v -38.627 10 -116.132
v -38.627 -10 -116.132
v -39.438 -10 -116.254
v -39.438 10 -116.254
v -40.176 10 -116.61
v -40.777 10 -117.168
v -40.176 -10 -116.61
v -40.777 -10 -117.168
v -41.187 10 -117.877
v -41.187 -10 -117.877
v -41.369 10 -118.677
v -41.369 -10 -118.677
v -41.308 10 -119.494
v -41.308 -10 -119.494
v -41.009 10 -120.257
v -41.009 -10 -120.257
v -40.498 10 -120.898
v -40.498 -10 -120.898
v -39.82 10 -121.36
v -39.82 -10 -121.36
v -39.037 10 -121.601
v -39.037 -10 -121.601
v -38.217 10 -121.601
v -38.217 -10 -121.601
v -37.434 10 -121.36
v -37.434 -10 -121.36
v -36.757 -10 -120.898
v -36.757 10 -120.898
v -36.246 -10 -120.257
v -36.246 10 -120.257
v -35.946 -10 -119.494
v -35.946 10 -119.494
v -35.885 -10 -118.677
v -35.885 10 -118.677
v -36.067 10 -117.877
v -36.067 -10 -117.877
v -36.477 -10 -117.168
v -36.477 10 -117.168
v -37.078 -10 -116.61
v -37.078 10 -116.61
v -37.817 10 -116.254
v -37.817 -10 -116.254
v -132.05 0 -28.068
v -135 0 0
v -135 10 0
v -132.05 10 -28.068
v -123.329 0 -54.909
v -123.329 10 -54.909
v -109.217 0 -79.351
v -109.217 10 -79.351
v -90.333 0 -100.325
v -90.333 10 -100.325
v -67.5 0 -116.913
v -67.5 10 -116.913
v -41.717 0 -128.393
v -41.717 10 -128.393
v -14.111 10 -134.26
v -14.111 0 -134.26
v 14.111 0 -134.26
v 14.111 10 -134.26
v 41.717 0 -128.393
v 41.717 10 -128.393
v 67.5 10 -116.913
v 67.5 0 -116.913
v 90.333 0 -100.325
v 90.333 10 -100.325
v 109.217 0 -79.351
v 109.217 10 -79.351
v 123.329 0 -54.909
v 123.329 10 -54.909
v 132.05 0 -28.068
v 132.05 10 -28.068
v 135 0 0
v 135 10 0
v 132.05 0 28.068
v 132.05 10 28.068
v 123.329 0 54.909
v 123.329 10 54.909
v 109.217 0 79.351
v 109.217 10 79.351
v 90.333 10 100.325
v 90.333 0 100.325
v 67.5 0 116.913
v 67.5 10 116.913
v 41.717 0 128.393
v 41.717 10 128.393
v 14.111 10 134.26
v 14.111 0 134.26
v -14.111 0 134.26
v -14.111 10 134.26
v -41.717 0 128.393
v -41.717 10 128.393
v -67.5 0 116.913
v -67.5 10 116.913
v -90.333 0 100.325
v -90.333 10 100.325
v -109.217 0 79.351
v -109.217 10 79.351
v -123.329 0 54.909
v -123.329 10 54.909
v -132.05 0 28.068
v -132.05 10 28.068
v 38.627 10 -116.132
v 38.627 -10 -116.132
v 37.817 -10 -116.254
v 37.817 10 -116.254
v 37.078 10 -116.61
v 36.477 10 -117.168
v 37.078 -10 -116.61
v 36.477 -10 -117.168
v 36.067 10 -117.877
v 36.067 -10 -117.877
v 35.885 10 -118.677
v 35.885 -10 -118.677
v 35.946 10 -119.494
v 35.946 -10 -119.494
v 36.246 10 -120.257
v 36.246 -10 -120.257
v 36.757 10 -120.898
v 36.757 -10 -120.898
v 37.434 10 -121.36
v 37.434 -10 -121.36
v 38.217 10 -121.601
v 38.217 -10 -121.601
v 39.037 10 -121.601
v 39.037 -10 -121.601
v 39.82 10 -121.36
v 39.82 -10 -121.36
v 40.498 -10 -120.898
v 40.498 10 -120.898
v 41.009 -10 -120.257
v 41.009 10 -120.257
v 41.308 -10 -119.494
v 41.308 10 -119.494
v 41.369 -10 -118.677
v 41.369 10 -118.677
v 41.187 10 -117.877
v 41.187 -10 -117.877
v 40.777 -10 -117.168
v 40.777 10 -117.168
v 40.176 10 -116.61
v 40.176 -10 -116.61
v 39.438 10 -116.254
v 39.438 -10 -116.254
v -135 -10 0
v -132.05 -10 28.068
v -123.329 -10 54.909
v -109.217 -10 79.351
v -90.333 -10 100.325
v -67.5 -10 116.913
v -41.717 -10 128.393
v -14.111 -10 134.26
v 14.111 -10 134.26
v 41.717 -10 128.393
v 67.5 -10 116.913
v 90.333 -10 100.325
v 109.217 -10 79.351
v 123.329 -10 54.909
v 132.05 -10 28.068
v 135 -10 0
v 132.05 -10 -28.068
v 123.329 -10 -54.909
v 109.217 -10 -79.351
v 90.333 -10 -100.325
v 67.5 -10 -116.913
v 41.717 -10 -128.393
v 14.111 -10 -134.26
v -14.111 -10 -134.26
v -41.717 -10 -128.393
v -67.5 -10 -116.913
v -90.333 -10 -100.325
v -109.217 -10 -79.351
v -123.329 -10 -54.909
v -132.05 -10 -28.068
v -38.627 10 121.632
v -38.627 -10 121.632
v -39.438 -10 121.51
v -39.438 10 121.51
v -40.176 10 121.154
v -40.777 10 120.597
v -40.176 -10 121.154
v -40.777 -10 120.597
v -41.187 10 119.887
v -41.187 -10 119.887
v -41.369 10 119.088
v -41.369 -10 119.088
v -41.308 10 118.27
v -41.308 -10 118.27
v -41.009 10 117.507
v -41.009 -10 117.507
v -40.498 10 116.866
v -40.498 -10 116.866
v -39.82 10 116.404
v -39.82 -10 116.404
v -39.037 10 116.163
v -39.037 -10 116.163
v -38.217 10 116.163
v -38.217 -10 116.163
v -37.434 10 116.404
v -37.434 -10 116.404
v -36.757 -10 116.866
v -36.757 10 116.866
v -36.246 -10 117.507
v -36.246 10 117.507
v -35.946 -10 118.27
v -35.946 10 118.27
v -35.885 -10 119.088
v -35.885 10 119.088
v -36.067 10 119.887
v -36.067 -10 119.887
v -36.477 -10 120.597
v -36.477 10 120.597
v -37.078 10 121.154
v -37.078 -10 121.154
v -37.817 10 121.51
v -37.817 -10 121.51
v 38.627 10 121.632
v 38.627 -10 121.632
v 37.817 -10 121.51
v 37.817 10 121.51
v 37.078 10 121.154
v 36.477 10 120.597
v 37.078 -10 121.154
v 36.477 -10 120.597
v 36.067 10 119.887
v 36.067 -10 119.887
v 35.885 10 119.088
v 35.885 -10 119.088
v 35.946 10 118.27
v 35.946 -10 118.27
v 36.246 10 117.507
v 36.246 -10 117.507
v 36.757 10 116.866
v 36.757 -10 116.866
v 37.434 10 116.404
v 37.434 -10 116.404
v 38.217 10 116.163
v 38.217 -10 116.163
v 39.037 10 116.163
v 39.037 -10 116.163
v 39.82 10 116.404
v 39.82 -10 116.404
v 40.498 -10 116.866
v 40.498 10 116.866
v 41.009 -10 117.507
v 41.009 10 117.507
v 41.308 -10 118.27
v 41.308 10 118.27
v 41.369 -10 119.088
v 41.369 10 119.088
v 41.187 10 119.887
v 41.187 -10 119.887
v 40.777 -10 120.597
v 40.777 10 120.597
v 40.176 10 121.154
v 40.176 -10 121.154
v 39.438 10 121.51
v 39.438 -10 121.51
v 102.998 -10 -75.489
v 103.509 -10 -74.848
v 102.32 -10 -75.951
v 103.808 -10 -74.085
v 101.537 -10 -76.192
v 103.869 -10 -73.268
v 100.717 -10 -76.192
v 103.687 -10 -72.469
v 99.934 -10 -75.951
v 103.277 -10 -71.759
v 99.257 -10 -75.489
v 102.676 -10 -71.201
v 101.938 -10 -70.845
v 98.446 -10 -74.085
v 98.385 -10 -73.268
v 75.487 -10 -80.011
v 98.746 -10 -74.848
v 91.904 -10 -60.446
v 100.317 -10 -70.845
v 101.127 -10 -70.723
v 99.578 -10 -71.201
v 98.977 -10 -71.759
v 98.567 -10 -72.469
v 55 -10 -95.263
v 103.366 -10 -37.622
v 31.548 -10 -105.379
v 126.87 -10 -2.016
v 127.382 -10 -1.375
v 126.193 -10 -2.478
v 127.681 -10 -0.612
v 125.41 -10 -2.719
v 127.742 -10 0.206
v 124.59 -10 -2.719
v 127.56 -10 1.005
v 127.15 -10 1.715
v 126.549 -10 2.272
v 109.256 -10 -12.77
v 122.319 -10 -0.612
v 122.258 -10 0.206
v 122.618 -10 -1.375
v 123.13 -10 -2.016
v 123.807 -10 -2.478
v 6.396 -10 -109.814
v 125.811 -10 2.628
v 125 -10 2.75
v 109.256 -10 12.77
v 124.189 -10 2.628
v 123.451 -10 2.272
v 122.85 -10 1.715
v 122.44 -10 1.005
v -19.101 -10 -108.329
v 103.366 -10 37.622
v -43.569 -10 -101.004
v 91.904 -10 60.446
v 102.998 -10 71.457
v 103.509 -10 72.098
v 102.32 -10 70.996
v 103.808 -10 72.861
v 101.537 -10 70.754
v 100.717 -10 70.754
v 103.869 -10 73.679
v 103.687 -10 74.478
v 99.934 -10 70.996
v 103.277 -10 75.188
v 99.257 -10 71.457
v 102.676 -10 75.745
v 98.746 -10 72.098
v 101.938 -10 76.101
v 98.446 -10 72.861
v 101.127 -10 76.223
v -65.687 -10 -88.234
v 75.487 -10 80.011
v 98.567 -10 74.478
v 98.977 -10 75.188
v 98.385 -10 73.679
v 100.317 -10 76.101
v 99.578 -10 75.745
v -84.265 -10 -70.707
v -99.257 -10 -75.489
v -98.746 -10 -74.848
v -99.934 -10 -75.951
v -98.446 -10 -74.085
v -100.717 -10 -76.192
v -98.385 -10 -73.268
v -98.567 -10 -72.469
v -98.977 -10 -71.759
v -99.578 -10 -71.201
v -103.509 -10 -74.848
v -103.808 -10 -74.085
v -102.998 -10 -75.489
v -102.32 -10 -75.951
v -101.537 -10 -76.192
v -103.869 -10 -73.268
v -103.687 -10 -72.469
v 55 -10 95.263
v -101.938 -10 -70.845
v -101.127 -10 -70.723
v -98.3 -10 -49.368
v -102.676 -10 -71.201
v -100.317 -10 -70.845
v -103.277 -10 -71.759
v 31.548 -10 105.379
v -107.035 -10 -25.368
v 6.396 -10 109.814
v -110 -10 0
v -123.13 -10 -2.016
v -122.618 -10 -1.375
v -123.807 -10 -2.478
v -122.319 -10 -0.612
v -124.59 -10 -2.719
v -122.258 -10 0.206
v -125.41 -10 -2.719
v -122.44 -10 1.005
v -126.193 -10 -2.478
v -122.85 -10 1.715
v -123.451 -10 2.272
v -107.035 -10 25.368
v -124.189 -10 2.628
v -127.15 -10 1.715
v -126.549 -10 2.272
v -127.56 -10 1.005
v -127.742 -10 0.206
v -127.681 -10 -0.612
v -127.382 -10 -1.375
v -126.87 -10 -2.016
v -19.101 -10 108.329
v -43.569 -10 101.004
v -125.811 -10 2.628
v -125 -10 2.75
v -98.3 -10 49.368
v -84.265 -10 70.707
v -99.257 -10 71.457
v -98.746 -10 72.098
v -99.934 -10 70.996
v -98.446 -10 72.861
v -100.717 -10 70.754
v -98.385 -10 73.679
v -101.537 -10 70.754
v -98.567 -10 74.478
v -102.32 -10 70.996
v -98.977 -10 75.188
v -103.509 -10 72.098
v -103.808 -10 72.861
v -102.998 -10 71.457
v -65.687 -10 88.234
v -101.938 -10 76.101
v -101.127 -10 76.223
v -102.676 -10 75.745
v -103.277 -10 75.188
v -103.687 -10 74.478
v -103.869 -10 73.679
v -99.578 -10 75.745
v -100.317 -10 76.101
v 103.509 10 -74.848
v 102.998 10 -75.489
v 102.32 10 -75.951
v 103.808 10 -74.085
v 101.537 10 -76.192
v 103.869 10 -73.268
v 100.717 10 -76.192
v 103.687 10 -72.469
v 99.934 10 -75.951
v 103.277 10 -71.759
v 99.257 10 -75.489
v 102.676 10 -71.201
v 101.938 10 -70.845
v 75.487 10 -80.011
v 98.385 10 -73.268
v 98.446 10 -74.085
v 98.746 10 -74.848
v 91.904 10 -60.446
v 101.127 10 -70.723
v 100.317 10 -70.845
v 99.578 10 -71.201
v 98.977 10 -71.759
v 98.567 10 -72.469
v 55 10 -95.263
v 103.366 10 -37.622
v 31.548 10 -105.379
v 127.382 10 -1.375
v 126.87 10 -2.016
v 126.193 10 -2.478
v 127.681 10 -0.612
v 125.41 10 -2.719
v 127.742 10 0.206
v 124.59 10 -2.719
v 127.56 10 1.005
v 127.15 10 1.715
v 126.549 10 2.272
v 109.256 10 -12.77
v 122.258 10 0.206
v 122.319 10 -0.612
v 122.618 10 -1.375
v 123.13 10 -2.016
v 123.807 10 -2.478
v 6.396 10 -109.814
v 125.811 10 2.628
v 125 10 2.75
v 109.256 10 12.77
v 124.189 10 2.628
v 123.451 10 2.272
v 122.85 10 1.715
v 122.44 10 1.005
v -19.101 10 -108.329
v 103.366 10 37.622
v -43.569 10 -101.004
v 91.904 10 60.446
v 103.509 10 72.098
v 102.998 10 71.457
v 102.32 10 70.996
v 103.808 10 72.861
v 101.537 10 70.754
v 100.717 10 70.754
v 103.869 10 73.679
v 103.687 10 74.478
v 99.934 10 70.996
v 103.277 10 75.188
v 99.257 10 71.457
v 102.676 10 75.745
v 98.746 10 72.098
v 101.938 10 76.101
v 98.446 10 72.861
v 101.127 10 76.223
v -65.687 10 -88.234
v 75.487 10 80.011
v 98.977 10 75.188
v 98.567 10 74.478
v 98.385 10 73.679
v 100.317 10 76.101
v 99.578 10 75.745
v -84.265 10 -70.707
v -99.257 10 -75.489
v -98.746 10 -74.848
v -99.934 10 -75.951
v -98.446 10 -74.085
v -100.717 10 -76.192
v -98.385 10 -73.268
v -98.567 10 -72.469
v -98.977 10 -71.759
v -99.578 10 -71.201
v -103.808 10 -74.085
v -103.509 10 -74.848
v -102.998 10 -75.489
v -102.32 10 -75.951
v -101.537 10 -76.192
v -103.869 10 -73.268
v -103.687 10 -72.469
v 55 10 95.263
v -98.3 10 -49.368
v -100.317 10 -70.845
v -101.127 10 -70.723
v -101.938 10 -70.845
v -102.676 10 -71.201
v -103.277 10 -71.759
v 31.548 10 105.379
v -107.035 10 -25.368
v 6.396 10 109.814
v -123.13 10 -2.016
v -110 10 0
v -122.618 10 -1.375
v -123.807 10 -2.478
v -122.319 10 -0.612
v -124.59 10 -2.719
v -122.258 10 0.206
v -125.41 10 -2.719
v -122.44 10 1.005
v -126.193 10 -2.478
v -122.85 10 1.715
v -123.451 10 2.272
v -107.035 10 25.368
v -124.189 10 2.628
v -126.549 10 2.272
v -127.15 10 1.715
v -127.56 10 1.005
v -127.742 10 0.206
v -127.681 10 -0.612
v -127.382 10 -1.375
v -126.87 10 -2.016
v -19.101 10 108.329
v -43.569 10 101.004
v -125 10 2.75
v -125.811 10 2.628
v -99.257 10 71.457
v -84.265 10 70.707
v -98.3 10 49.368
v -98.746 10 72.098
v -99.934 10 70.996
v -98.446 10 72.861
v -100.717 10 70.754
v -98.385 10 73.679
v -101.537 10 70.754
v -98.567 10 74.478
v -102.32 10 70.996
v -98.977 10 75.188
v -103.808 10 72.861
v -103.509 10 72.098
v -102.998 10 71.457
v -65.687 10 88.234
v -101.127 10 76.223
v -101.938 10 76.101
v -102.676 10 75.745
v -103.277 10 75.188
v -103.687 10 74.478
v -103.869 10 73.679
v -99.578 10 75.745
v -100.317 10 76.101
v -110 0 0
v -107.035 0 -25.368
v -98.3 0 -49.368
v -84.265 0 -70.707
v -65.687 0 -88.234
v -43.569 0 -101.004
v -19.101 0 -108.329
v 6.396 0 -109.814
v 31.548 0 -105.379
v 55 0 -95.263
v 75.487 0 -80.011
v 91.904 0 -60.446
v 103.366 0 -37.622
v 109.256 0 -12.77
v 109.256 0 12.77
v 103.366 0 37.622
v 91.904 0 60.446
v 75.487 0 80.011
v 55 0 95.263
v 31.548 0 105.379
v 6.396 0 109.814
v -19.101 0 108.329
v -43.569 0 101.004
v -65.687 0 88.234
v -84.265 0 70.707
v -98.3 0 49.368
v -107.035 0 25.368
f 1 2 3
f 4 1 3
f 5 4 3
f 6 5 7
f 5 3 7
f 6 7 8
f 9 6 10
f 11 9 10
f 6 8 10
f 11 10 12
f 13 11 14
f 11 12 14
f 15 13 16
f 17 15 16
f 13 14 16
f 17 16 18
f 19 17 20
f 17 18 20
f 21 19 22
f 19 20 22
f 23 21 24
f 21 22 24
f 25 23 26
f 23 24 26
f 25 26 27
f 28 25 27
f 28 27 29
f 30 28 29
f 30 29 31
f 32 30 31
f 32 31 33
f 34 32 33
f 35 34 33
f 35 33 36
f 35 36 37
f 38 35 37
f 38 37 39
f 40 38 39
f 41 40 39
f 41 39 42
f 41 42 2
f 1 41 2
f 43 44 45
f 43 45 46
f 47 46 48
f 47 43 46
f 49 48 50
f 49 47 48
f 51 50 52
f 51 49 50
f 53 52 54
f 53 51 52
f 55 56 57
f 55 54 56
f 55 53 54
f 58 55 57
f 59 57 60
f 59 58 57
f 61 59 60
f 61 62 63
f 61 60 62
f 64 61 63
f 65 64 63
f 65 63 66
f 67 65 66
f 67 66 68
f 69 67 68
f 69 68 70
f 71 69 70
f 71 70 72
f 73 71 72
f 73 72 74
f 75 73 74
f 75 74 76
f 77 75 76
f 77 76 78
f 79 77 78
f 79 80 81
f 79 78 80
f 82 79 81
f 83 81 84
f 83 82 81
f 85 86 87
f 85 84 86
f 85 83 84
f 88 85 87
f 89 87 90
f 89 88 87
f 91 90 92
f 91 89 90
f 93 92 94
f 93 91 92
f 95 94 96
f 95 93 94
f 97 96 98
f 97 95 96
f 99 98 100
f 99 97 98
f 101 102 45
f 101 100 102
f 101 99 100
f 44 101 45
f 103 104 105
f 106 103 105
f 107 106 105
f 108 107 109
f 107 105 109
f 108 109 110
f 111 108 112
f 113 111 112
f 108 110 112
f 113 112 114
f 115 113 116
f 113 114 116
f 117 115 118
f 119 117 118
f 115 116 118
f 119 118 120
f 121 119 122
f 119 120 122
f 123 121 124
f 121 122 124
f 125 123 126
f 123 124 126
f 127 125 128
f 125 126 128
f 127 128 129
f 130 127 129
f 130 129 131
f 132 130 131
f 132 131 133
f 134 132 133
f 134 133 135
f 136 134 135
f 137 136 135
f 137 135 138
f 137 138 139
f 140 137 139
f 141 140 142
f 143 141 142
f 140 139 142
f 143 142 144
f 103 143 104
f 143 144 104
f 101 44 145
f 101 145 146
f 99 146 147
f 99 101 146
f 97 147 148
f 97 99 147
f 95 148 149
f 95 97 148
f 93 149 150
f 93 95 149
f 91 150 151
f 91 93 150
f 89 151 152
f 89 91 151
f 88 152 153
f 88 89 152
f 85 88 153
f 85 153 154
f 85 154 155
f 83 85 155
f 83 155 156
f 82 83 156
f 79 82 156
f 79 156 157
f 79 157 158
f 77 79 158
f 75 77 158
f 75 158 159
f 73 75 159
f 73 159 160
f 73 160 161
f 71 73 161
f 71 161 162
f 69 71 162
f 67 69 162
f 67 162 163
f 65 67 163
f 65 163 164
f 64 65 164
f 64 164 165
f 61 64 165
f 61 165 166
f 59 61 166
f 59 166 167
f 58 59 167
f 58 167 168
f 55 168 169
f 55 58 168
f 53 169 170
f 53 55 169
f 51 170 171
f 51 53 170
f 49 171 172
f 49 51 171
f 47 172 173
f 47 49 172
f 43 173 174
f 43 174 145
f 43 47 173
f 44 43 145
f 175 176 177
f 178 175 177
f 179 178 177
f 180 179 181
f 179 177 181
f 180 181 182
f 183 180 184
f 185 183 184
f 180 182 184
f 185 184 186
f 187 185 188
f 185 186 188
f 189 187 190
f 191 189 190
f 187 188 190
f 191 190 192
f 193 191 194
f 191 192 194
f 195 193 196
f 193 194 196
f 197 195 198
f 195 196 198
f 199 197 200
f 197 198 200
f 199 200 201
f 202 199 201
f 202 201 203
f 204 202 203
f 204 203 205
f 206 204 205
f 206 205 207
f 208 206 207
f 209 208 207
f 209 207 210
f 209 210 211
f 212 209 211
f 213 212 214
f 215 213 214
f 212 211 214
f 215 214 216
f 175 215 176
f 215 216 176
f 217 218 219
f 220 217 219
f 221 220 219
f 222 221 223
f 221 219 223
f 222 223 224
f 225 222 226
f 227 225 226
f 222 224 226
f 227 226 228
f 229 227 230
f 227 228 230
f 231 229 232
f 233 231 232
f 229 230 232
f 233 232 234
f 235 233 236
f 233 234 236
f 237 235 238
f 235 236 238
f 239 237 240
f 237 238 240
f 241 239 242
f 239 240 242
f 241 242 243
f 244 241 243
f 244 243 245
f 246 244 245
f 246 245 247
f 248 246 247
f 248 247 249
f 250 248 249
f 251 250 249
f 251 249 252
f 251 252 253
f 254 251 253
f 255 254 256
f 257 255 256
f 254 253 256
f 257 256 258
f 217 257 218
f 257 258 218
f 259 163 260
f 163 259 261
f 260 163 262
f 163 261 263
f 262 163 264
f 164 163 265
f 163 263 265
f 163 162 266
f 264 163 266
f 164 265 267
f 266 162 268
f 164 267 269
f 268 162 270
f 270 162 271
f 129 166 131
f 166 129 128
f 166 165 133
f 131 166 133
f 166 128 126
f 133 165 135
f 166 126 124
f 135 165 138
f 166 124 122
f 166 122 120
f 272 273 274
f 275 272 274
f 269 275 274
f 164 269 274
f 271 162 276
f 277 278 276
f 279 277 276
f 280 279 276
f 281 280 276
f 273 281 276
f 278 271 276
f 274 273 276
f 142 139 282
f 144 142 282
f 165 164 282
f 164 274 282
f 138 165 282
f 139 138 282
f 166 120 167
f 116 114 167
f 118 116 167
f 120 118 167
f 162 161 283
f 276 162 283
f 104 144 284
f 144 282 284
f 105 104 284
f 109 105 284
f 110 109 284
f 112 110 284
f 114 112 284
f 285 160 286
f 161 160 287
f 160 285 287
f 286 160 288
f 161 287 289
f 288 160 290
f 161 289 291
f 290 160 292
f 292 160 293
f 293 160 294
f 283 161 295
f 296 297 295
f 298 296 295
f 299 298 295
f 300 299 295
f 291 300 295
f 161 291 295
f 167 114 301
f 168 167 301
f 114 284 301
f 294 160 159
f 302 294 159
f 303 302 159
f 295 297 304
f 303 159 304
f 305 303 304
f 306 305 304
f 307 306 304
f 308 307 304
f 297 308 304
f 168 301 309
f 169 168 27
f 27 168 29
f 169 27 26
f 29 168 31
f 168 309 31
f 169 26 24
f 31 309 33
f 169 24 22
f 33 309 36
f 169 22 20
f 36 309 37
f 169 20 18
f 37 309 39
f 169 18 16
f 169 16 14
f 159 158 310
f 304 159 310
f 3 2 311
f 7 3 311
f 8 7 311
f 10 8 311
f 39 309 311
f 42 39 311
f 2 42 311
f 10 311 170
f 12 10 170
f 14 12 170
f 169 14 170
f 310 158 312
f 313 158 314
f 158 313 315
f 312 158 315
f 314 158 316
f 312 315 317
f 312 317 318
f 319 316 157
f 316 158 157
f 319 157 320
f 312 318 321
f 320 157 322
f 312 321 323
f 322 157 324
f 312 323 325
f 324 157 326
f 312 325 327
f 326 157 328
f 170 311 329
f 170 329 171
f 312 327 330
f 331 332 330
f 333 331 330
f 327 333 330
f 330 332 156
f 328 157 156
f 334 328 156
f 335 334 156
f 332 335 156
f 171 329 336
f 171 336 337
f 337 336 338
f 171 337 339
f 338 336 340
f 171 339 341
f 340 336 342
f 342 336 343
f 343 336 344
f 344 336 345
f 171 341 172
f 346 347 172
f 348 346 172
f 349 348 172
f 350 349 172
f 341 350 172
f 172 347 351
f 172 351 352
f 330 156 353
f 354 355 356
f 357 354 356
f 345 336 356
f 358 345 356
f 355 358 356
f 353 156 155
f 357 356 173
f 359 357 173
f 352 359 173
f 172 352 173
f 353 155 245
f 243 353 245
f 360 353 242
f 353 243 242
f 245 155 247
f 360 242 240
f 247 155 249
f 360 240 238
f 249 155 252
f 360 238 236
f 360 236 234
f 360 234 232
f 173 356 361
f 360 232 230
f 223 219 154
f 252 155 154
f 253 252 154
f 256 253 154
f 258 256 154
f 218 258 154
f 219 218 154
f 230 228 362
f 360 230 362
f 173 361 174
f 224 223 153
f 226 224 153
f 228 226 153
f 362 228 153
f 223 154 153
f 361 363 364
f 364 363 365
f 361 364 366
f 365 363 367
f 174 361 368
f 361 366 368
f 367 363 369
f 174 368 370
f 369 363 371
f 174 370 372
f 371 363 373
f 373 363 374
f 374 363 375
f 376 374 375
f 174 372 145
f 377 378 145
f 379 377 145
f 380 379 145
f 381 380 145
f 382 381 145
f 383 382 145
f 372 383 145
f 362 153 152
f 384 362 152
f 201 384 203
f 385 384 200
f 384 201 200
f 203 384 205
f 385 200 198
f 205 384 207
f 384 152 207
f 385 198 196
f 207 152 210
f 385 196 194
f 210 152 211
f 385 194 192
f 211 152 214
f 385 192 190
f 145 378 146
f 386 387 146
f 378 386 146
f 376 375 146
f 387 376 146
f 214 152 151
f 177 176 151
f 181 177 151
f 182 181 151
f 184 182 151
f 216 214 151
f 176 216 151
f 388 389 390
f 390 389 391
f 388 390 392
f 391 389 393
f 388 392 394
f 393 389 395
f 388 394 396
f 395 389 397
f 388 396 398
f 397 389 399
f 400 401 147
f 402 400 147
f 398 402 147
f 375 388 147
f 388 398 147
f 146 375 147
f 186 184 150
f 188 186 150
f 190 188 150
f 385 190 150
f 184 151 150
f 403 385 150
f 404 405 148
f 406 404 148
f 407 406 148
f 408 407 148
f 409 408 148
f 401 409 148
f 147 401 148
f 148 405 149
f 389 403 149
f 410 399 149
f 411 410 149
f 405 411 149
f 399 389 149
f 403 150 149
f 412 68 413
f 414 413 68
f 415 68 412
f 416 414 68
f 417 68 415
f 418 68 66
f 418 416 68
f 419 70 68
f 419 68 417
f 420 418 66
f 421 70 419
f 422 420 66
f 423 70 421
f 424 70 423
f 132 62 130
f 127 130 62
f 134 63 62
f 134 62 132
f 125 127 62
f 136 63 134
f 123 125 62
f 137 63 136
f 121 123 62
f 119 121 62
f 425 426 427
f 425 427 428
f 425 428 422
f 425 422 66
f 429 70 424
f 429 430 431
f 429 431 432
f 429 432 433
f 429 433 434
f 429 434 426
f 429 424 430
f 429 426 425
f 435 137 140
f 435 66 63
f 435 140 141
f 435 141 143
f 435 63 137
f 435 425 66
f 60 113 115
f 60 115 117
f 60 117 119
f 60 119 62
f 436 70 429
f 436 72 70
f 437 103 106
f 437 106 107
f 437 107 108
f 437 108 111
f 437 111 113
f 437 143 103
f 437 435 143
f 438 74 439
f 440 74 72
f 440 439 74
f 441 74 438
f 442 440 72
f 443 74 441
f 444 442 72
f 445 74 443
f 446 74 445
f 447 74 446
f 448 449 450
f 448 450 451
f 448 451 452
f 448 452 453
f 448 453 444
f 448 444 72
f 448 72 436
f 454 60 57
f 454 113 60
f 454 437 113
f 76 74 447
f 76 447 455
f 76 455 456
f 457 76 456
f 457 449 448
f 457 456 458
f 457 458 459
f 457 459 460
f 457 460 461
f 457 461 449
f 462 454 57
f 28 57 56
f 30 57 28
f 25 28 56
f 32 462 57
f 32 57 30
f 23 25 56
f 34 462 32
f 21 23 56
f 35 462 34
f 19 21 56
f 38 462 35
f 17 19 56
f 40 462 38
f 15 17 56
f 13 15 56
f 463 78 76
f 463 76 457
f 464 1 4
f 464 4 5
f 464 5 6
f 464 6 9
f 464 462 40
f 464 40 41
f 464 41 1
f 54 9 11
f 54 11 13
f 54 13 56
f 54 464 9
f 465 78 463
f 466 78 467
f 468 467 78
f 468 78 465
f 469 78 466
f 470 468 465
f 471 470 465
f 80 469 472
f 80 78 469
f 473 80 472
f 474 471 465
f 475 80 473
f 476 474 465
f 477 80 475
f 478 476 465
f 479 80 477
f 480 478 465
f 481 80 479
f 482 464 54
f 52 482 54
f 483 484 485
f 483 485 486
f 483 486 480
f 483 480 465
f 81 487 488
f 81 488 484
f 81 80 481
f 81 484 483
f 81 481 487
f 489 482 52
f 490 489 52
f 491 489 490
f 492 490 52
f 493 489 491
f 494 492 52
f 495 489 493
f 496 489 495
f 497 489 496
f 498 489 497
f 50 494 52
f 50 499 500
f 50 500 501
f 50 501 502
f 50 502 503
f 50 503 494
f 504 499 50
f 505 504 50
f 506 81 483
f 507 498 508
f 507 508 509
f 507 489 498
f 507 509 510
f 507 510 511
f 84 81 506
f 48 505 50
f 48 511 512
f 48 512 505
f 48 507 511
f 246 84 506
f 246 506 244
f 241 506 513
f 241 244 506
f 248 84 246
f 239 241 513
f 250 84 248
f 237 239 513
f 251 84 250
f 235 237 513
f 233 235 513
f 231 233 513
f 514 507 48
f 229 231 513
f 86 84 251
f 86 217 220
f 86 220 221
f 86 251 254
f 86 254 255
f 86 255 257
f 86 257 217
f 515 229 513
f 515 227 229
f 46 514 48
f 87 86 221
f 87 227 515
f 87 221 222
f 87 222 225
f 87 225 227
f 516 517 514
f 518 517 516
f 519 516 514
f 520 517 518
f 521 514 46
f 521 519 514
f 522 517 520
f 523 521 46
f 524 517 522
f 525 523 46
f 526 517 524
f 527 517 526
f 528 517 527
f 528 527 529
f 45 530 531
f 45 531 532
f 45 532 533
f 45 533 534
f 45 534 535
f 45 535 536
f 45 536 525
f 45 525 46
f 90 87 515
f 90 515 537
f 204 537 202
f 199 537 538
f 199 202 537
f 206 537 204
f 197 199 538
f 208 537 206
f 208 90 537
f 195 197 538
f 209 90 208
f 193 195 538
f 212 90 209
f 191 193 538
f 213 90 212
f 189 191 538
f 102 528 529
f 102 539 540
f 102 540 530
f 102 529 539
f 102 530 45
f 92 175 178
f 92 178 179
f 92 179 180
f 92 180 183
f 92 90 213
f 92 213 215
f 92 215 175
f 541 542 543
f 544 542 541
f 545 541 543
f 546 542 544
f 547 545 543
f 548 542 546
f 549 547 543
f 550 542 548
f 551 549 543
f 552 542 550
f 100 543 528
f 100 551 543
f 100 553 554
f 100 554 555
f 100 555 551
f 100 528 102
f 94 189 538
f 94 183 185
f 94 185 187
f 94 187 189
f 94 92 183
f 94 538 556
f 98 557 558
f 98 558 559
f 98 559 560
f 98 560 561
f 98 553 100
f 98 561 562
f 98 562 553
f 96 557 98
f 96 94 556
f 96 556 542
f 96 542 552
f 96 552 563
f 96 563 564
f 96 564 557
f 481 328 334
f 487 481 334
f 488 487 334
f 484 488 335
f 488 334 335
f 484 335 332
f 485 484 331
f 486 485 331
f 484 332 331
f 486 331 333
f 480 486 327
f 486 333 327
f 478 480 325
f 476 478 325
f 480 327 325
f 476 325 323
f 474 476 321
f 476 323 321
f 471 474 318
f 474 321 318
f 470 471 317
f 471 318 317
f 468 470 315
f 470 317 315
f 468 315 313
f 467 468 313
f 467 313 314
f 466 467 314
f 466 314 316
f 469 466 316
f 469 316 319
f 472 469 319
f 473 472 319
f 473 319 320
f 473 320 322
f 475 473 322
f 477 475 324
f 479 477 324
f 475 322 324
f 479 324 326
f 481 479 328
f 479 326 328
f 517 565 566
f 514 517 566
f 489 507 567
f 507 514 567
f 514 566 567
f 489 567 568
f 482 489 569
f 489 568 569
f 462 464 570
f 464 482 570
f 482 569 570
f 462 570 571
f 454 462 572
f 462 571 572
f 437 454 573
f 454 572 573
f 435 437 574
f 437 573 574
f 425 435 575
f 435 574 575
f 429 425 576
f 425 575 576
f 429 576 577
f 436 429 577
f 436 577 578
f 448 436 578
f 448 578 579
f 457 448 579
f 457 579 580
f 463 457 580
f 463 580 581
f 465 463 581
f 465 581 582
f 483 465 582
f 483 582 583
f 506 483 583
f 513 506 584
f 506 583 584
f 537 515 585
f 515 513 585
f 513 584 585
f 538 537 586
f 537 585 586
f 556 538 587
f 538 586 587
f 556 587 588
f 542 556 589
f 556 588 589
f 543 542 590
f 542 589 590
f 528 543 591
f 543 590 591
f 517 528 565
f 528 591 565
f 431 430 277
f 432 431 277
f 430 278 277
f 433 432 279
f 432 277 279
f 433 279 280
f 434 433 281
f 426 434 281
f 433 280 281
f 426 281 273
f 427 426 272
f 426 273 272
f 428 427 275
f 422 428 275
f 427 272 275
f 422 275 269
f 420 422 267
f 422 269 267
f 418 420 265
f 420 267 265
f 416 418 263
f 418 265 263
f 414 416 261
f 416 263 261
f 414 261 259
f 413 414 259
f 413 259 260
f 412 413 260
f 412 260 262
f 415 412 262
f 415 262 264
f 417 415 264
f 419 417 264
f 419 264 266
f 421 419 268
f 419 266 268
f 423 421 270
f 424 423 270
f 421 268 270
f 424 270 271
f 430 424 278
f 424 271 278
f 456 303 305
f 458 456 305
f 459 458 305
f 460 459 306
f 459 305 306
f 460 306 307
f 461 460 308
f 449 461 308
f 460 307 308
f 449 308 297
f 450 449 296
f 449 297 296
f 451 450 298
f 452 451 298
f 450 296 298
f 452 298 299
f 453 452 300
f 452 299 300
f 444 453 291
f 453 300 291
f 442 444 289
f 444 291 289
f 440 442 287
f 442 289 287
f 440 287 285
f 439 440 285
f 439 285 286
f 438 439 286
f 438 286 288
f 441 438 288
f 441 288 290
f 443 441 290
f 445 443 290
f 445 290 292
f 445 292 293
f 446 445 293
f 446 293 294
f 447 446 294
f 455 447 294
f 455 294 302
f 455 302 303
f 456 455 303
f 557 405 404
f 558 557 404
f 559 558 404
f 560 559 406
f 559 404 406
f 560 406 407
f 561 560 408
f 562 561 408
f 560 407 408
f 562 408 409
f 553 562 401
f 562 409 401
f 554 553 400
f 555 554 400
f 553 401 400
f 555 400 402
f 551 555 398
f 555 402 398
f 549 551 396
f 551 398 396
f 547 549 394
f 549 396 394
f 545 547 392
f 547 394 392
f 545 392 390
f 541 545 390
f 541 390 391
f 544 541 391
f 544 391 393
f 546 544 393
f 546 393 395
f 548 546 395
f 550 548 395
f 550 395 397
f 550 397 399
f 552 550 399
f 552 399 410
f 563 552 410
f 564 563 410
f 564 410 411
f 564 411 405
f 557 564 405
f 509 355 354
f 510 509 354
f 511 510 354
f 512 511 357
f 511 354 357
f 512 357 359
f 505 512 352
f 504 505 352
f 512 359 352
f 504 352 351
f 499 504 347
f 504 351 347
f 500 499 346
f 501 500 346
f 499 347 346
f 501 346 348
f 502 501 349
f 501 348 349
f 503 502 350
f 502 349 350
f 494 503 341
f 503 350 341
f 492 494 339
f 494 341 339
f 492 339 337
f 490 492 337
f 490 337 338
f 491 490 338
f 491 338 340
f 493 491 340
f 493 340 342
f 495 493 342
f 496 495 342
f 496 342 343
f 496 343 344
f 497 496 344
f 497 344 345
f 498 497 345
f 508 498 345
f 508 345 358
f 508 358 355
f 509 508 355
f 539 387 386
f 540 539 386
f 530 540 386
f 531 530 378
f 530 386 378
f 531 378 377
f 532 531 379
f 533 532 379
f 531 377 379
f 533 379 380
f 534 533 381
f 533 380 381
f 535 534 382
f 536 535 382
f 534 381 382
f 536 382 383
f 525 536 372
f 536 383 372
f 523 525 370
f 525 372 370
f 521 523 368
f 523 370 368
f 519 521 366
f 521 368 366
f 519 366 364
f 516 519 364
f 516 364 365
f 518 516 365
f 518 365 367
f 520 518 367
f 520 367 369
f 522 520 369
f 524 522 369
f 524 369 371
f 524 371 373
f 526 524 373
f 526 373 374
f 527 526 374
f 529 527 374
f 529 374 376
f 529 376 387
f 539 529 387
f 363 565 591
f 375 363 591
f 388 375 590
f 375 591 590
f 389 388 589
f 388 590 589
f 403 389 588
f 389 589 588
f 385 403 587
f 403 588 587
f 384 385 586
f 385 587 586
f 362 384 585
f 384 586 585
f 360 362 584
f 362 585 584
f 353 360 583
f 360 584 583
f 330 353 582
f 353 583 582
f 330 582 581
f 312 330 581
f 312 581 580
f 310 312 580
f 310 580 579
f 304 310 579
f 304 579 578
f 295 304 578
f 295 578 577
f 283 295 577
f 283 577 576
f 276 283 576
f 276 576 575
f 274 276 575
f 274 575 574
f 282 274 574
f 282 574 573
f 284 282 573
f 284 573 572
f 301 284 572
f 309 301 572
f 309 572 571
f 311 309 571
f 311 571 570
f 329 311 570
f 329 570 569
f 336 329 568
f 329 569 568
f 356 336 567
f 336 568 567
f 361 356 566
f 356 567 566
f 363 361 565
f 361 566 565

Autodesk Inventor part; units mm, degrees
ref_plane "YZ Plane" through (0, 0, 0) normal (1, 0, 0) x (0, 1, 0)
ref_plane "XZ Plane" through (0, 0, 0) normal (0, 1, 0) x (-1, 0, 0)
ref_plane "XY Plane" through (0, 0, 0) normal (0, 0, 1) x (1, 0, 0)
sketch "Sketch1" plane through (0, 0, 0) normal (0, 1, 0) x (-1, 0, 0)
  circle A0 centre (0, 0) radius 135
  circle A1 centre (0, 0) radius 110
  dimension "d0" = 270
  dimension "d1" = 220
extrude "Extrusion1" add sketch "Sketch1" along normal mid plane 20
sketch "Sketch3" plane through (0, 10, 0) normal (0, 1, 0) x (1, 0, 0)
  circle A0 centre (0, 0) radius 125
  circle A1 centre (125, 0) radius 2.5
  circle A2 centre (101.1271, 73.4732) radius 2.5
  circle A3 centre (38.6271, 118.8821) radius 2.5
  circle A4 centre (-38.6271, 118.8821) radius 2.5
  circle A5 centre (-101.1271, 73.4732) radius 2.5
  circle A6 centre (-125, 0) radius 2.5
  circle A7 centre (-101.1271, -73.4732) radius 2.5
  circle A8 centre (-38.6271, -118.8821) radius 2.5
  circle A9 centre (38.6271, -118.8821) radius 2.5
  circle A10 centre (101.1271, -73.4732) radius 2.5
  dimension "d7" = 250
  dimension "d8" = 5
  dimension "d11" = 360
hole "Hole1" at (125, 10, 0) at (101.1271, 10, 73.4732) at (38.6271, 10, 118.8821) at (-38.6271, 10, 118.8821) at (-101.1271, 10, 73.4732) at (-125, 10, 0) at (-101.1271, 10, -73.4732) at (-38.6271, 10, -118.8821) at (38.6271, 10, -118.8821) at (101.1271, 10, -73.4732) direction (0, -1, 0) diameter 5.5 end through all
properties part number "Cylinder Spacer (x3)"
